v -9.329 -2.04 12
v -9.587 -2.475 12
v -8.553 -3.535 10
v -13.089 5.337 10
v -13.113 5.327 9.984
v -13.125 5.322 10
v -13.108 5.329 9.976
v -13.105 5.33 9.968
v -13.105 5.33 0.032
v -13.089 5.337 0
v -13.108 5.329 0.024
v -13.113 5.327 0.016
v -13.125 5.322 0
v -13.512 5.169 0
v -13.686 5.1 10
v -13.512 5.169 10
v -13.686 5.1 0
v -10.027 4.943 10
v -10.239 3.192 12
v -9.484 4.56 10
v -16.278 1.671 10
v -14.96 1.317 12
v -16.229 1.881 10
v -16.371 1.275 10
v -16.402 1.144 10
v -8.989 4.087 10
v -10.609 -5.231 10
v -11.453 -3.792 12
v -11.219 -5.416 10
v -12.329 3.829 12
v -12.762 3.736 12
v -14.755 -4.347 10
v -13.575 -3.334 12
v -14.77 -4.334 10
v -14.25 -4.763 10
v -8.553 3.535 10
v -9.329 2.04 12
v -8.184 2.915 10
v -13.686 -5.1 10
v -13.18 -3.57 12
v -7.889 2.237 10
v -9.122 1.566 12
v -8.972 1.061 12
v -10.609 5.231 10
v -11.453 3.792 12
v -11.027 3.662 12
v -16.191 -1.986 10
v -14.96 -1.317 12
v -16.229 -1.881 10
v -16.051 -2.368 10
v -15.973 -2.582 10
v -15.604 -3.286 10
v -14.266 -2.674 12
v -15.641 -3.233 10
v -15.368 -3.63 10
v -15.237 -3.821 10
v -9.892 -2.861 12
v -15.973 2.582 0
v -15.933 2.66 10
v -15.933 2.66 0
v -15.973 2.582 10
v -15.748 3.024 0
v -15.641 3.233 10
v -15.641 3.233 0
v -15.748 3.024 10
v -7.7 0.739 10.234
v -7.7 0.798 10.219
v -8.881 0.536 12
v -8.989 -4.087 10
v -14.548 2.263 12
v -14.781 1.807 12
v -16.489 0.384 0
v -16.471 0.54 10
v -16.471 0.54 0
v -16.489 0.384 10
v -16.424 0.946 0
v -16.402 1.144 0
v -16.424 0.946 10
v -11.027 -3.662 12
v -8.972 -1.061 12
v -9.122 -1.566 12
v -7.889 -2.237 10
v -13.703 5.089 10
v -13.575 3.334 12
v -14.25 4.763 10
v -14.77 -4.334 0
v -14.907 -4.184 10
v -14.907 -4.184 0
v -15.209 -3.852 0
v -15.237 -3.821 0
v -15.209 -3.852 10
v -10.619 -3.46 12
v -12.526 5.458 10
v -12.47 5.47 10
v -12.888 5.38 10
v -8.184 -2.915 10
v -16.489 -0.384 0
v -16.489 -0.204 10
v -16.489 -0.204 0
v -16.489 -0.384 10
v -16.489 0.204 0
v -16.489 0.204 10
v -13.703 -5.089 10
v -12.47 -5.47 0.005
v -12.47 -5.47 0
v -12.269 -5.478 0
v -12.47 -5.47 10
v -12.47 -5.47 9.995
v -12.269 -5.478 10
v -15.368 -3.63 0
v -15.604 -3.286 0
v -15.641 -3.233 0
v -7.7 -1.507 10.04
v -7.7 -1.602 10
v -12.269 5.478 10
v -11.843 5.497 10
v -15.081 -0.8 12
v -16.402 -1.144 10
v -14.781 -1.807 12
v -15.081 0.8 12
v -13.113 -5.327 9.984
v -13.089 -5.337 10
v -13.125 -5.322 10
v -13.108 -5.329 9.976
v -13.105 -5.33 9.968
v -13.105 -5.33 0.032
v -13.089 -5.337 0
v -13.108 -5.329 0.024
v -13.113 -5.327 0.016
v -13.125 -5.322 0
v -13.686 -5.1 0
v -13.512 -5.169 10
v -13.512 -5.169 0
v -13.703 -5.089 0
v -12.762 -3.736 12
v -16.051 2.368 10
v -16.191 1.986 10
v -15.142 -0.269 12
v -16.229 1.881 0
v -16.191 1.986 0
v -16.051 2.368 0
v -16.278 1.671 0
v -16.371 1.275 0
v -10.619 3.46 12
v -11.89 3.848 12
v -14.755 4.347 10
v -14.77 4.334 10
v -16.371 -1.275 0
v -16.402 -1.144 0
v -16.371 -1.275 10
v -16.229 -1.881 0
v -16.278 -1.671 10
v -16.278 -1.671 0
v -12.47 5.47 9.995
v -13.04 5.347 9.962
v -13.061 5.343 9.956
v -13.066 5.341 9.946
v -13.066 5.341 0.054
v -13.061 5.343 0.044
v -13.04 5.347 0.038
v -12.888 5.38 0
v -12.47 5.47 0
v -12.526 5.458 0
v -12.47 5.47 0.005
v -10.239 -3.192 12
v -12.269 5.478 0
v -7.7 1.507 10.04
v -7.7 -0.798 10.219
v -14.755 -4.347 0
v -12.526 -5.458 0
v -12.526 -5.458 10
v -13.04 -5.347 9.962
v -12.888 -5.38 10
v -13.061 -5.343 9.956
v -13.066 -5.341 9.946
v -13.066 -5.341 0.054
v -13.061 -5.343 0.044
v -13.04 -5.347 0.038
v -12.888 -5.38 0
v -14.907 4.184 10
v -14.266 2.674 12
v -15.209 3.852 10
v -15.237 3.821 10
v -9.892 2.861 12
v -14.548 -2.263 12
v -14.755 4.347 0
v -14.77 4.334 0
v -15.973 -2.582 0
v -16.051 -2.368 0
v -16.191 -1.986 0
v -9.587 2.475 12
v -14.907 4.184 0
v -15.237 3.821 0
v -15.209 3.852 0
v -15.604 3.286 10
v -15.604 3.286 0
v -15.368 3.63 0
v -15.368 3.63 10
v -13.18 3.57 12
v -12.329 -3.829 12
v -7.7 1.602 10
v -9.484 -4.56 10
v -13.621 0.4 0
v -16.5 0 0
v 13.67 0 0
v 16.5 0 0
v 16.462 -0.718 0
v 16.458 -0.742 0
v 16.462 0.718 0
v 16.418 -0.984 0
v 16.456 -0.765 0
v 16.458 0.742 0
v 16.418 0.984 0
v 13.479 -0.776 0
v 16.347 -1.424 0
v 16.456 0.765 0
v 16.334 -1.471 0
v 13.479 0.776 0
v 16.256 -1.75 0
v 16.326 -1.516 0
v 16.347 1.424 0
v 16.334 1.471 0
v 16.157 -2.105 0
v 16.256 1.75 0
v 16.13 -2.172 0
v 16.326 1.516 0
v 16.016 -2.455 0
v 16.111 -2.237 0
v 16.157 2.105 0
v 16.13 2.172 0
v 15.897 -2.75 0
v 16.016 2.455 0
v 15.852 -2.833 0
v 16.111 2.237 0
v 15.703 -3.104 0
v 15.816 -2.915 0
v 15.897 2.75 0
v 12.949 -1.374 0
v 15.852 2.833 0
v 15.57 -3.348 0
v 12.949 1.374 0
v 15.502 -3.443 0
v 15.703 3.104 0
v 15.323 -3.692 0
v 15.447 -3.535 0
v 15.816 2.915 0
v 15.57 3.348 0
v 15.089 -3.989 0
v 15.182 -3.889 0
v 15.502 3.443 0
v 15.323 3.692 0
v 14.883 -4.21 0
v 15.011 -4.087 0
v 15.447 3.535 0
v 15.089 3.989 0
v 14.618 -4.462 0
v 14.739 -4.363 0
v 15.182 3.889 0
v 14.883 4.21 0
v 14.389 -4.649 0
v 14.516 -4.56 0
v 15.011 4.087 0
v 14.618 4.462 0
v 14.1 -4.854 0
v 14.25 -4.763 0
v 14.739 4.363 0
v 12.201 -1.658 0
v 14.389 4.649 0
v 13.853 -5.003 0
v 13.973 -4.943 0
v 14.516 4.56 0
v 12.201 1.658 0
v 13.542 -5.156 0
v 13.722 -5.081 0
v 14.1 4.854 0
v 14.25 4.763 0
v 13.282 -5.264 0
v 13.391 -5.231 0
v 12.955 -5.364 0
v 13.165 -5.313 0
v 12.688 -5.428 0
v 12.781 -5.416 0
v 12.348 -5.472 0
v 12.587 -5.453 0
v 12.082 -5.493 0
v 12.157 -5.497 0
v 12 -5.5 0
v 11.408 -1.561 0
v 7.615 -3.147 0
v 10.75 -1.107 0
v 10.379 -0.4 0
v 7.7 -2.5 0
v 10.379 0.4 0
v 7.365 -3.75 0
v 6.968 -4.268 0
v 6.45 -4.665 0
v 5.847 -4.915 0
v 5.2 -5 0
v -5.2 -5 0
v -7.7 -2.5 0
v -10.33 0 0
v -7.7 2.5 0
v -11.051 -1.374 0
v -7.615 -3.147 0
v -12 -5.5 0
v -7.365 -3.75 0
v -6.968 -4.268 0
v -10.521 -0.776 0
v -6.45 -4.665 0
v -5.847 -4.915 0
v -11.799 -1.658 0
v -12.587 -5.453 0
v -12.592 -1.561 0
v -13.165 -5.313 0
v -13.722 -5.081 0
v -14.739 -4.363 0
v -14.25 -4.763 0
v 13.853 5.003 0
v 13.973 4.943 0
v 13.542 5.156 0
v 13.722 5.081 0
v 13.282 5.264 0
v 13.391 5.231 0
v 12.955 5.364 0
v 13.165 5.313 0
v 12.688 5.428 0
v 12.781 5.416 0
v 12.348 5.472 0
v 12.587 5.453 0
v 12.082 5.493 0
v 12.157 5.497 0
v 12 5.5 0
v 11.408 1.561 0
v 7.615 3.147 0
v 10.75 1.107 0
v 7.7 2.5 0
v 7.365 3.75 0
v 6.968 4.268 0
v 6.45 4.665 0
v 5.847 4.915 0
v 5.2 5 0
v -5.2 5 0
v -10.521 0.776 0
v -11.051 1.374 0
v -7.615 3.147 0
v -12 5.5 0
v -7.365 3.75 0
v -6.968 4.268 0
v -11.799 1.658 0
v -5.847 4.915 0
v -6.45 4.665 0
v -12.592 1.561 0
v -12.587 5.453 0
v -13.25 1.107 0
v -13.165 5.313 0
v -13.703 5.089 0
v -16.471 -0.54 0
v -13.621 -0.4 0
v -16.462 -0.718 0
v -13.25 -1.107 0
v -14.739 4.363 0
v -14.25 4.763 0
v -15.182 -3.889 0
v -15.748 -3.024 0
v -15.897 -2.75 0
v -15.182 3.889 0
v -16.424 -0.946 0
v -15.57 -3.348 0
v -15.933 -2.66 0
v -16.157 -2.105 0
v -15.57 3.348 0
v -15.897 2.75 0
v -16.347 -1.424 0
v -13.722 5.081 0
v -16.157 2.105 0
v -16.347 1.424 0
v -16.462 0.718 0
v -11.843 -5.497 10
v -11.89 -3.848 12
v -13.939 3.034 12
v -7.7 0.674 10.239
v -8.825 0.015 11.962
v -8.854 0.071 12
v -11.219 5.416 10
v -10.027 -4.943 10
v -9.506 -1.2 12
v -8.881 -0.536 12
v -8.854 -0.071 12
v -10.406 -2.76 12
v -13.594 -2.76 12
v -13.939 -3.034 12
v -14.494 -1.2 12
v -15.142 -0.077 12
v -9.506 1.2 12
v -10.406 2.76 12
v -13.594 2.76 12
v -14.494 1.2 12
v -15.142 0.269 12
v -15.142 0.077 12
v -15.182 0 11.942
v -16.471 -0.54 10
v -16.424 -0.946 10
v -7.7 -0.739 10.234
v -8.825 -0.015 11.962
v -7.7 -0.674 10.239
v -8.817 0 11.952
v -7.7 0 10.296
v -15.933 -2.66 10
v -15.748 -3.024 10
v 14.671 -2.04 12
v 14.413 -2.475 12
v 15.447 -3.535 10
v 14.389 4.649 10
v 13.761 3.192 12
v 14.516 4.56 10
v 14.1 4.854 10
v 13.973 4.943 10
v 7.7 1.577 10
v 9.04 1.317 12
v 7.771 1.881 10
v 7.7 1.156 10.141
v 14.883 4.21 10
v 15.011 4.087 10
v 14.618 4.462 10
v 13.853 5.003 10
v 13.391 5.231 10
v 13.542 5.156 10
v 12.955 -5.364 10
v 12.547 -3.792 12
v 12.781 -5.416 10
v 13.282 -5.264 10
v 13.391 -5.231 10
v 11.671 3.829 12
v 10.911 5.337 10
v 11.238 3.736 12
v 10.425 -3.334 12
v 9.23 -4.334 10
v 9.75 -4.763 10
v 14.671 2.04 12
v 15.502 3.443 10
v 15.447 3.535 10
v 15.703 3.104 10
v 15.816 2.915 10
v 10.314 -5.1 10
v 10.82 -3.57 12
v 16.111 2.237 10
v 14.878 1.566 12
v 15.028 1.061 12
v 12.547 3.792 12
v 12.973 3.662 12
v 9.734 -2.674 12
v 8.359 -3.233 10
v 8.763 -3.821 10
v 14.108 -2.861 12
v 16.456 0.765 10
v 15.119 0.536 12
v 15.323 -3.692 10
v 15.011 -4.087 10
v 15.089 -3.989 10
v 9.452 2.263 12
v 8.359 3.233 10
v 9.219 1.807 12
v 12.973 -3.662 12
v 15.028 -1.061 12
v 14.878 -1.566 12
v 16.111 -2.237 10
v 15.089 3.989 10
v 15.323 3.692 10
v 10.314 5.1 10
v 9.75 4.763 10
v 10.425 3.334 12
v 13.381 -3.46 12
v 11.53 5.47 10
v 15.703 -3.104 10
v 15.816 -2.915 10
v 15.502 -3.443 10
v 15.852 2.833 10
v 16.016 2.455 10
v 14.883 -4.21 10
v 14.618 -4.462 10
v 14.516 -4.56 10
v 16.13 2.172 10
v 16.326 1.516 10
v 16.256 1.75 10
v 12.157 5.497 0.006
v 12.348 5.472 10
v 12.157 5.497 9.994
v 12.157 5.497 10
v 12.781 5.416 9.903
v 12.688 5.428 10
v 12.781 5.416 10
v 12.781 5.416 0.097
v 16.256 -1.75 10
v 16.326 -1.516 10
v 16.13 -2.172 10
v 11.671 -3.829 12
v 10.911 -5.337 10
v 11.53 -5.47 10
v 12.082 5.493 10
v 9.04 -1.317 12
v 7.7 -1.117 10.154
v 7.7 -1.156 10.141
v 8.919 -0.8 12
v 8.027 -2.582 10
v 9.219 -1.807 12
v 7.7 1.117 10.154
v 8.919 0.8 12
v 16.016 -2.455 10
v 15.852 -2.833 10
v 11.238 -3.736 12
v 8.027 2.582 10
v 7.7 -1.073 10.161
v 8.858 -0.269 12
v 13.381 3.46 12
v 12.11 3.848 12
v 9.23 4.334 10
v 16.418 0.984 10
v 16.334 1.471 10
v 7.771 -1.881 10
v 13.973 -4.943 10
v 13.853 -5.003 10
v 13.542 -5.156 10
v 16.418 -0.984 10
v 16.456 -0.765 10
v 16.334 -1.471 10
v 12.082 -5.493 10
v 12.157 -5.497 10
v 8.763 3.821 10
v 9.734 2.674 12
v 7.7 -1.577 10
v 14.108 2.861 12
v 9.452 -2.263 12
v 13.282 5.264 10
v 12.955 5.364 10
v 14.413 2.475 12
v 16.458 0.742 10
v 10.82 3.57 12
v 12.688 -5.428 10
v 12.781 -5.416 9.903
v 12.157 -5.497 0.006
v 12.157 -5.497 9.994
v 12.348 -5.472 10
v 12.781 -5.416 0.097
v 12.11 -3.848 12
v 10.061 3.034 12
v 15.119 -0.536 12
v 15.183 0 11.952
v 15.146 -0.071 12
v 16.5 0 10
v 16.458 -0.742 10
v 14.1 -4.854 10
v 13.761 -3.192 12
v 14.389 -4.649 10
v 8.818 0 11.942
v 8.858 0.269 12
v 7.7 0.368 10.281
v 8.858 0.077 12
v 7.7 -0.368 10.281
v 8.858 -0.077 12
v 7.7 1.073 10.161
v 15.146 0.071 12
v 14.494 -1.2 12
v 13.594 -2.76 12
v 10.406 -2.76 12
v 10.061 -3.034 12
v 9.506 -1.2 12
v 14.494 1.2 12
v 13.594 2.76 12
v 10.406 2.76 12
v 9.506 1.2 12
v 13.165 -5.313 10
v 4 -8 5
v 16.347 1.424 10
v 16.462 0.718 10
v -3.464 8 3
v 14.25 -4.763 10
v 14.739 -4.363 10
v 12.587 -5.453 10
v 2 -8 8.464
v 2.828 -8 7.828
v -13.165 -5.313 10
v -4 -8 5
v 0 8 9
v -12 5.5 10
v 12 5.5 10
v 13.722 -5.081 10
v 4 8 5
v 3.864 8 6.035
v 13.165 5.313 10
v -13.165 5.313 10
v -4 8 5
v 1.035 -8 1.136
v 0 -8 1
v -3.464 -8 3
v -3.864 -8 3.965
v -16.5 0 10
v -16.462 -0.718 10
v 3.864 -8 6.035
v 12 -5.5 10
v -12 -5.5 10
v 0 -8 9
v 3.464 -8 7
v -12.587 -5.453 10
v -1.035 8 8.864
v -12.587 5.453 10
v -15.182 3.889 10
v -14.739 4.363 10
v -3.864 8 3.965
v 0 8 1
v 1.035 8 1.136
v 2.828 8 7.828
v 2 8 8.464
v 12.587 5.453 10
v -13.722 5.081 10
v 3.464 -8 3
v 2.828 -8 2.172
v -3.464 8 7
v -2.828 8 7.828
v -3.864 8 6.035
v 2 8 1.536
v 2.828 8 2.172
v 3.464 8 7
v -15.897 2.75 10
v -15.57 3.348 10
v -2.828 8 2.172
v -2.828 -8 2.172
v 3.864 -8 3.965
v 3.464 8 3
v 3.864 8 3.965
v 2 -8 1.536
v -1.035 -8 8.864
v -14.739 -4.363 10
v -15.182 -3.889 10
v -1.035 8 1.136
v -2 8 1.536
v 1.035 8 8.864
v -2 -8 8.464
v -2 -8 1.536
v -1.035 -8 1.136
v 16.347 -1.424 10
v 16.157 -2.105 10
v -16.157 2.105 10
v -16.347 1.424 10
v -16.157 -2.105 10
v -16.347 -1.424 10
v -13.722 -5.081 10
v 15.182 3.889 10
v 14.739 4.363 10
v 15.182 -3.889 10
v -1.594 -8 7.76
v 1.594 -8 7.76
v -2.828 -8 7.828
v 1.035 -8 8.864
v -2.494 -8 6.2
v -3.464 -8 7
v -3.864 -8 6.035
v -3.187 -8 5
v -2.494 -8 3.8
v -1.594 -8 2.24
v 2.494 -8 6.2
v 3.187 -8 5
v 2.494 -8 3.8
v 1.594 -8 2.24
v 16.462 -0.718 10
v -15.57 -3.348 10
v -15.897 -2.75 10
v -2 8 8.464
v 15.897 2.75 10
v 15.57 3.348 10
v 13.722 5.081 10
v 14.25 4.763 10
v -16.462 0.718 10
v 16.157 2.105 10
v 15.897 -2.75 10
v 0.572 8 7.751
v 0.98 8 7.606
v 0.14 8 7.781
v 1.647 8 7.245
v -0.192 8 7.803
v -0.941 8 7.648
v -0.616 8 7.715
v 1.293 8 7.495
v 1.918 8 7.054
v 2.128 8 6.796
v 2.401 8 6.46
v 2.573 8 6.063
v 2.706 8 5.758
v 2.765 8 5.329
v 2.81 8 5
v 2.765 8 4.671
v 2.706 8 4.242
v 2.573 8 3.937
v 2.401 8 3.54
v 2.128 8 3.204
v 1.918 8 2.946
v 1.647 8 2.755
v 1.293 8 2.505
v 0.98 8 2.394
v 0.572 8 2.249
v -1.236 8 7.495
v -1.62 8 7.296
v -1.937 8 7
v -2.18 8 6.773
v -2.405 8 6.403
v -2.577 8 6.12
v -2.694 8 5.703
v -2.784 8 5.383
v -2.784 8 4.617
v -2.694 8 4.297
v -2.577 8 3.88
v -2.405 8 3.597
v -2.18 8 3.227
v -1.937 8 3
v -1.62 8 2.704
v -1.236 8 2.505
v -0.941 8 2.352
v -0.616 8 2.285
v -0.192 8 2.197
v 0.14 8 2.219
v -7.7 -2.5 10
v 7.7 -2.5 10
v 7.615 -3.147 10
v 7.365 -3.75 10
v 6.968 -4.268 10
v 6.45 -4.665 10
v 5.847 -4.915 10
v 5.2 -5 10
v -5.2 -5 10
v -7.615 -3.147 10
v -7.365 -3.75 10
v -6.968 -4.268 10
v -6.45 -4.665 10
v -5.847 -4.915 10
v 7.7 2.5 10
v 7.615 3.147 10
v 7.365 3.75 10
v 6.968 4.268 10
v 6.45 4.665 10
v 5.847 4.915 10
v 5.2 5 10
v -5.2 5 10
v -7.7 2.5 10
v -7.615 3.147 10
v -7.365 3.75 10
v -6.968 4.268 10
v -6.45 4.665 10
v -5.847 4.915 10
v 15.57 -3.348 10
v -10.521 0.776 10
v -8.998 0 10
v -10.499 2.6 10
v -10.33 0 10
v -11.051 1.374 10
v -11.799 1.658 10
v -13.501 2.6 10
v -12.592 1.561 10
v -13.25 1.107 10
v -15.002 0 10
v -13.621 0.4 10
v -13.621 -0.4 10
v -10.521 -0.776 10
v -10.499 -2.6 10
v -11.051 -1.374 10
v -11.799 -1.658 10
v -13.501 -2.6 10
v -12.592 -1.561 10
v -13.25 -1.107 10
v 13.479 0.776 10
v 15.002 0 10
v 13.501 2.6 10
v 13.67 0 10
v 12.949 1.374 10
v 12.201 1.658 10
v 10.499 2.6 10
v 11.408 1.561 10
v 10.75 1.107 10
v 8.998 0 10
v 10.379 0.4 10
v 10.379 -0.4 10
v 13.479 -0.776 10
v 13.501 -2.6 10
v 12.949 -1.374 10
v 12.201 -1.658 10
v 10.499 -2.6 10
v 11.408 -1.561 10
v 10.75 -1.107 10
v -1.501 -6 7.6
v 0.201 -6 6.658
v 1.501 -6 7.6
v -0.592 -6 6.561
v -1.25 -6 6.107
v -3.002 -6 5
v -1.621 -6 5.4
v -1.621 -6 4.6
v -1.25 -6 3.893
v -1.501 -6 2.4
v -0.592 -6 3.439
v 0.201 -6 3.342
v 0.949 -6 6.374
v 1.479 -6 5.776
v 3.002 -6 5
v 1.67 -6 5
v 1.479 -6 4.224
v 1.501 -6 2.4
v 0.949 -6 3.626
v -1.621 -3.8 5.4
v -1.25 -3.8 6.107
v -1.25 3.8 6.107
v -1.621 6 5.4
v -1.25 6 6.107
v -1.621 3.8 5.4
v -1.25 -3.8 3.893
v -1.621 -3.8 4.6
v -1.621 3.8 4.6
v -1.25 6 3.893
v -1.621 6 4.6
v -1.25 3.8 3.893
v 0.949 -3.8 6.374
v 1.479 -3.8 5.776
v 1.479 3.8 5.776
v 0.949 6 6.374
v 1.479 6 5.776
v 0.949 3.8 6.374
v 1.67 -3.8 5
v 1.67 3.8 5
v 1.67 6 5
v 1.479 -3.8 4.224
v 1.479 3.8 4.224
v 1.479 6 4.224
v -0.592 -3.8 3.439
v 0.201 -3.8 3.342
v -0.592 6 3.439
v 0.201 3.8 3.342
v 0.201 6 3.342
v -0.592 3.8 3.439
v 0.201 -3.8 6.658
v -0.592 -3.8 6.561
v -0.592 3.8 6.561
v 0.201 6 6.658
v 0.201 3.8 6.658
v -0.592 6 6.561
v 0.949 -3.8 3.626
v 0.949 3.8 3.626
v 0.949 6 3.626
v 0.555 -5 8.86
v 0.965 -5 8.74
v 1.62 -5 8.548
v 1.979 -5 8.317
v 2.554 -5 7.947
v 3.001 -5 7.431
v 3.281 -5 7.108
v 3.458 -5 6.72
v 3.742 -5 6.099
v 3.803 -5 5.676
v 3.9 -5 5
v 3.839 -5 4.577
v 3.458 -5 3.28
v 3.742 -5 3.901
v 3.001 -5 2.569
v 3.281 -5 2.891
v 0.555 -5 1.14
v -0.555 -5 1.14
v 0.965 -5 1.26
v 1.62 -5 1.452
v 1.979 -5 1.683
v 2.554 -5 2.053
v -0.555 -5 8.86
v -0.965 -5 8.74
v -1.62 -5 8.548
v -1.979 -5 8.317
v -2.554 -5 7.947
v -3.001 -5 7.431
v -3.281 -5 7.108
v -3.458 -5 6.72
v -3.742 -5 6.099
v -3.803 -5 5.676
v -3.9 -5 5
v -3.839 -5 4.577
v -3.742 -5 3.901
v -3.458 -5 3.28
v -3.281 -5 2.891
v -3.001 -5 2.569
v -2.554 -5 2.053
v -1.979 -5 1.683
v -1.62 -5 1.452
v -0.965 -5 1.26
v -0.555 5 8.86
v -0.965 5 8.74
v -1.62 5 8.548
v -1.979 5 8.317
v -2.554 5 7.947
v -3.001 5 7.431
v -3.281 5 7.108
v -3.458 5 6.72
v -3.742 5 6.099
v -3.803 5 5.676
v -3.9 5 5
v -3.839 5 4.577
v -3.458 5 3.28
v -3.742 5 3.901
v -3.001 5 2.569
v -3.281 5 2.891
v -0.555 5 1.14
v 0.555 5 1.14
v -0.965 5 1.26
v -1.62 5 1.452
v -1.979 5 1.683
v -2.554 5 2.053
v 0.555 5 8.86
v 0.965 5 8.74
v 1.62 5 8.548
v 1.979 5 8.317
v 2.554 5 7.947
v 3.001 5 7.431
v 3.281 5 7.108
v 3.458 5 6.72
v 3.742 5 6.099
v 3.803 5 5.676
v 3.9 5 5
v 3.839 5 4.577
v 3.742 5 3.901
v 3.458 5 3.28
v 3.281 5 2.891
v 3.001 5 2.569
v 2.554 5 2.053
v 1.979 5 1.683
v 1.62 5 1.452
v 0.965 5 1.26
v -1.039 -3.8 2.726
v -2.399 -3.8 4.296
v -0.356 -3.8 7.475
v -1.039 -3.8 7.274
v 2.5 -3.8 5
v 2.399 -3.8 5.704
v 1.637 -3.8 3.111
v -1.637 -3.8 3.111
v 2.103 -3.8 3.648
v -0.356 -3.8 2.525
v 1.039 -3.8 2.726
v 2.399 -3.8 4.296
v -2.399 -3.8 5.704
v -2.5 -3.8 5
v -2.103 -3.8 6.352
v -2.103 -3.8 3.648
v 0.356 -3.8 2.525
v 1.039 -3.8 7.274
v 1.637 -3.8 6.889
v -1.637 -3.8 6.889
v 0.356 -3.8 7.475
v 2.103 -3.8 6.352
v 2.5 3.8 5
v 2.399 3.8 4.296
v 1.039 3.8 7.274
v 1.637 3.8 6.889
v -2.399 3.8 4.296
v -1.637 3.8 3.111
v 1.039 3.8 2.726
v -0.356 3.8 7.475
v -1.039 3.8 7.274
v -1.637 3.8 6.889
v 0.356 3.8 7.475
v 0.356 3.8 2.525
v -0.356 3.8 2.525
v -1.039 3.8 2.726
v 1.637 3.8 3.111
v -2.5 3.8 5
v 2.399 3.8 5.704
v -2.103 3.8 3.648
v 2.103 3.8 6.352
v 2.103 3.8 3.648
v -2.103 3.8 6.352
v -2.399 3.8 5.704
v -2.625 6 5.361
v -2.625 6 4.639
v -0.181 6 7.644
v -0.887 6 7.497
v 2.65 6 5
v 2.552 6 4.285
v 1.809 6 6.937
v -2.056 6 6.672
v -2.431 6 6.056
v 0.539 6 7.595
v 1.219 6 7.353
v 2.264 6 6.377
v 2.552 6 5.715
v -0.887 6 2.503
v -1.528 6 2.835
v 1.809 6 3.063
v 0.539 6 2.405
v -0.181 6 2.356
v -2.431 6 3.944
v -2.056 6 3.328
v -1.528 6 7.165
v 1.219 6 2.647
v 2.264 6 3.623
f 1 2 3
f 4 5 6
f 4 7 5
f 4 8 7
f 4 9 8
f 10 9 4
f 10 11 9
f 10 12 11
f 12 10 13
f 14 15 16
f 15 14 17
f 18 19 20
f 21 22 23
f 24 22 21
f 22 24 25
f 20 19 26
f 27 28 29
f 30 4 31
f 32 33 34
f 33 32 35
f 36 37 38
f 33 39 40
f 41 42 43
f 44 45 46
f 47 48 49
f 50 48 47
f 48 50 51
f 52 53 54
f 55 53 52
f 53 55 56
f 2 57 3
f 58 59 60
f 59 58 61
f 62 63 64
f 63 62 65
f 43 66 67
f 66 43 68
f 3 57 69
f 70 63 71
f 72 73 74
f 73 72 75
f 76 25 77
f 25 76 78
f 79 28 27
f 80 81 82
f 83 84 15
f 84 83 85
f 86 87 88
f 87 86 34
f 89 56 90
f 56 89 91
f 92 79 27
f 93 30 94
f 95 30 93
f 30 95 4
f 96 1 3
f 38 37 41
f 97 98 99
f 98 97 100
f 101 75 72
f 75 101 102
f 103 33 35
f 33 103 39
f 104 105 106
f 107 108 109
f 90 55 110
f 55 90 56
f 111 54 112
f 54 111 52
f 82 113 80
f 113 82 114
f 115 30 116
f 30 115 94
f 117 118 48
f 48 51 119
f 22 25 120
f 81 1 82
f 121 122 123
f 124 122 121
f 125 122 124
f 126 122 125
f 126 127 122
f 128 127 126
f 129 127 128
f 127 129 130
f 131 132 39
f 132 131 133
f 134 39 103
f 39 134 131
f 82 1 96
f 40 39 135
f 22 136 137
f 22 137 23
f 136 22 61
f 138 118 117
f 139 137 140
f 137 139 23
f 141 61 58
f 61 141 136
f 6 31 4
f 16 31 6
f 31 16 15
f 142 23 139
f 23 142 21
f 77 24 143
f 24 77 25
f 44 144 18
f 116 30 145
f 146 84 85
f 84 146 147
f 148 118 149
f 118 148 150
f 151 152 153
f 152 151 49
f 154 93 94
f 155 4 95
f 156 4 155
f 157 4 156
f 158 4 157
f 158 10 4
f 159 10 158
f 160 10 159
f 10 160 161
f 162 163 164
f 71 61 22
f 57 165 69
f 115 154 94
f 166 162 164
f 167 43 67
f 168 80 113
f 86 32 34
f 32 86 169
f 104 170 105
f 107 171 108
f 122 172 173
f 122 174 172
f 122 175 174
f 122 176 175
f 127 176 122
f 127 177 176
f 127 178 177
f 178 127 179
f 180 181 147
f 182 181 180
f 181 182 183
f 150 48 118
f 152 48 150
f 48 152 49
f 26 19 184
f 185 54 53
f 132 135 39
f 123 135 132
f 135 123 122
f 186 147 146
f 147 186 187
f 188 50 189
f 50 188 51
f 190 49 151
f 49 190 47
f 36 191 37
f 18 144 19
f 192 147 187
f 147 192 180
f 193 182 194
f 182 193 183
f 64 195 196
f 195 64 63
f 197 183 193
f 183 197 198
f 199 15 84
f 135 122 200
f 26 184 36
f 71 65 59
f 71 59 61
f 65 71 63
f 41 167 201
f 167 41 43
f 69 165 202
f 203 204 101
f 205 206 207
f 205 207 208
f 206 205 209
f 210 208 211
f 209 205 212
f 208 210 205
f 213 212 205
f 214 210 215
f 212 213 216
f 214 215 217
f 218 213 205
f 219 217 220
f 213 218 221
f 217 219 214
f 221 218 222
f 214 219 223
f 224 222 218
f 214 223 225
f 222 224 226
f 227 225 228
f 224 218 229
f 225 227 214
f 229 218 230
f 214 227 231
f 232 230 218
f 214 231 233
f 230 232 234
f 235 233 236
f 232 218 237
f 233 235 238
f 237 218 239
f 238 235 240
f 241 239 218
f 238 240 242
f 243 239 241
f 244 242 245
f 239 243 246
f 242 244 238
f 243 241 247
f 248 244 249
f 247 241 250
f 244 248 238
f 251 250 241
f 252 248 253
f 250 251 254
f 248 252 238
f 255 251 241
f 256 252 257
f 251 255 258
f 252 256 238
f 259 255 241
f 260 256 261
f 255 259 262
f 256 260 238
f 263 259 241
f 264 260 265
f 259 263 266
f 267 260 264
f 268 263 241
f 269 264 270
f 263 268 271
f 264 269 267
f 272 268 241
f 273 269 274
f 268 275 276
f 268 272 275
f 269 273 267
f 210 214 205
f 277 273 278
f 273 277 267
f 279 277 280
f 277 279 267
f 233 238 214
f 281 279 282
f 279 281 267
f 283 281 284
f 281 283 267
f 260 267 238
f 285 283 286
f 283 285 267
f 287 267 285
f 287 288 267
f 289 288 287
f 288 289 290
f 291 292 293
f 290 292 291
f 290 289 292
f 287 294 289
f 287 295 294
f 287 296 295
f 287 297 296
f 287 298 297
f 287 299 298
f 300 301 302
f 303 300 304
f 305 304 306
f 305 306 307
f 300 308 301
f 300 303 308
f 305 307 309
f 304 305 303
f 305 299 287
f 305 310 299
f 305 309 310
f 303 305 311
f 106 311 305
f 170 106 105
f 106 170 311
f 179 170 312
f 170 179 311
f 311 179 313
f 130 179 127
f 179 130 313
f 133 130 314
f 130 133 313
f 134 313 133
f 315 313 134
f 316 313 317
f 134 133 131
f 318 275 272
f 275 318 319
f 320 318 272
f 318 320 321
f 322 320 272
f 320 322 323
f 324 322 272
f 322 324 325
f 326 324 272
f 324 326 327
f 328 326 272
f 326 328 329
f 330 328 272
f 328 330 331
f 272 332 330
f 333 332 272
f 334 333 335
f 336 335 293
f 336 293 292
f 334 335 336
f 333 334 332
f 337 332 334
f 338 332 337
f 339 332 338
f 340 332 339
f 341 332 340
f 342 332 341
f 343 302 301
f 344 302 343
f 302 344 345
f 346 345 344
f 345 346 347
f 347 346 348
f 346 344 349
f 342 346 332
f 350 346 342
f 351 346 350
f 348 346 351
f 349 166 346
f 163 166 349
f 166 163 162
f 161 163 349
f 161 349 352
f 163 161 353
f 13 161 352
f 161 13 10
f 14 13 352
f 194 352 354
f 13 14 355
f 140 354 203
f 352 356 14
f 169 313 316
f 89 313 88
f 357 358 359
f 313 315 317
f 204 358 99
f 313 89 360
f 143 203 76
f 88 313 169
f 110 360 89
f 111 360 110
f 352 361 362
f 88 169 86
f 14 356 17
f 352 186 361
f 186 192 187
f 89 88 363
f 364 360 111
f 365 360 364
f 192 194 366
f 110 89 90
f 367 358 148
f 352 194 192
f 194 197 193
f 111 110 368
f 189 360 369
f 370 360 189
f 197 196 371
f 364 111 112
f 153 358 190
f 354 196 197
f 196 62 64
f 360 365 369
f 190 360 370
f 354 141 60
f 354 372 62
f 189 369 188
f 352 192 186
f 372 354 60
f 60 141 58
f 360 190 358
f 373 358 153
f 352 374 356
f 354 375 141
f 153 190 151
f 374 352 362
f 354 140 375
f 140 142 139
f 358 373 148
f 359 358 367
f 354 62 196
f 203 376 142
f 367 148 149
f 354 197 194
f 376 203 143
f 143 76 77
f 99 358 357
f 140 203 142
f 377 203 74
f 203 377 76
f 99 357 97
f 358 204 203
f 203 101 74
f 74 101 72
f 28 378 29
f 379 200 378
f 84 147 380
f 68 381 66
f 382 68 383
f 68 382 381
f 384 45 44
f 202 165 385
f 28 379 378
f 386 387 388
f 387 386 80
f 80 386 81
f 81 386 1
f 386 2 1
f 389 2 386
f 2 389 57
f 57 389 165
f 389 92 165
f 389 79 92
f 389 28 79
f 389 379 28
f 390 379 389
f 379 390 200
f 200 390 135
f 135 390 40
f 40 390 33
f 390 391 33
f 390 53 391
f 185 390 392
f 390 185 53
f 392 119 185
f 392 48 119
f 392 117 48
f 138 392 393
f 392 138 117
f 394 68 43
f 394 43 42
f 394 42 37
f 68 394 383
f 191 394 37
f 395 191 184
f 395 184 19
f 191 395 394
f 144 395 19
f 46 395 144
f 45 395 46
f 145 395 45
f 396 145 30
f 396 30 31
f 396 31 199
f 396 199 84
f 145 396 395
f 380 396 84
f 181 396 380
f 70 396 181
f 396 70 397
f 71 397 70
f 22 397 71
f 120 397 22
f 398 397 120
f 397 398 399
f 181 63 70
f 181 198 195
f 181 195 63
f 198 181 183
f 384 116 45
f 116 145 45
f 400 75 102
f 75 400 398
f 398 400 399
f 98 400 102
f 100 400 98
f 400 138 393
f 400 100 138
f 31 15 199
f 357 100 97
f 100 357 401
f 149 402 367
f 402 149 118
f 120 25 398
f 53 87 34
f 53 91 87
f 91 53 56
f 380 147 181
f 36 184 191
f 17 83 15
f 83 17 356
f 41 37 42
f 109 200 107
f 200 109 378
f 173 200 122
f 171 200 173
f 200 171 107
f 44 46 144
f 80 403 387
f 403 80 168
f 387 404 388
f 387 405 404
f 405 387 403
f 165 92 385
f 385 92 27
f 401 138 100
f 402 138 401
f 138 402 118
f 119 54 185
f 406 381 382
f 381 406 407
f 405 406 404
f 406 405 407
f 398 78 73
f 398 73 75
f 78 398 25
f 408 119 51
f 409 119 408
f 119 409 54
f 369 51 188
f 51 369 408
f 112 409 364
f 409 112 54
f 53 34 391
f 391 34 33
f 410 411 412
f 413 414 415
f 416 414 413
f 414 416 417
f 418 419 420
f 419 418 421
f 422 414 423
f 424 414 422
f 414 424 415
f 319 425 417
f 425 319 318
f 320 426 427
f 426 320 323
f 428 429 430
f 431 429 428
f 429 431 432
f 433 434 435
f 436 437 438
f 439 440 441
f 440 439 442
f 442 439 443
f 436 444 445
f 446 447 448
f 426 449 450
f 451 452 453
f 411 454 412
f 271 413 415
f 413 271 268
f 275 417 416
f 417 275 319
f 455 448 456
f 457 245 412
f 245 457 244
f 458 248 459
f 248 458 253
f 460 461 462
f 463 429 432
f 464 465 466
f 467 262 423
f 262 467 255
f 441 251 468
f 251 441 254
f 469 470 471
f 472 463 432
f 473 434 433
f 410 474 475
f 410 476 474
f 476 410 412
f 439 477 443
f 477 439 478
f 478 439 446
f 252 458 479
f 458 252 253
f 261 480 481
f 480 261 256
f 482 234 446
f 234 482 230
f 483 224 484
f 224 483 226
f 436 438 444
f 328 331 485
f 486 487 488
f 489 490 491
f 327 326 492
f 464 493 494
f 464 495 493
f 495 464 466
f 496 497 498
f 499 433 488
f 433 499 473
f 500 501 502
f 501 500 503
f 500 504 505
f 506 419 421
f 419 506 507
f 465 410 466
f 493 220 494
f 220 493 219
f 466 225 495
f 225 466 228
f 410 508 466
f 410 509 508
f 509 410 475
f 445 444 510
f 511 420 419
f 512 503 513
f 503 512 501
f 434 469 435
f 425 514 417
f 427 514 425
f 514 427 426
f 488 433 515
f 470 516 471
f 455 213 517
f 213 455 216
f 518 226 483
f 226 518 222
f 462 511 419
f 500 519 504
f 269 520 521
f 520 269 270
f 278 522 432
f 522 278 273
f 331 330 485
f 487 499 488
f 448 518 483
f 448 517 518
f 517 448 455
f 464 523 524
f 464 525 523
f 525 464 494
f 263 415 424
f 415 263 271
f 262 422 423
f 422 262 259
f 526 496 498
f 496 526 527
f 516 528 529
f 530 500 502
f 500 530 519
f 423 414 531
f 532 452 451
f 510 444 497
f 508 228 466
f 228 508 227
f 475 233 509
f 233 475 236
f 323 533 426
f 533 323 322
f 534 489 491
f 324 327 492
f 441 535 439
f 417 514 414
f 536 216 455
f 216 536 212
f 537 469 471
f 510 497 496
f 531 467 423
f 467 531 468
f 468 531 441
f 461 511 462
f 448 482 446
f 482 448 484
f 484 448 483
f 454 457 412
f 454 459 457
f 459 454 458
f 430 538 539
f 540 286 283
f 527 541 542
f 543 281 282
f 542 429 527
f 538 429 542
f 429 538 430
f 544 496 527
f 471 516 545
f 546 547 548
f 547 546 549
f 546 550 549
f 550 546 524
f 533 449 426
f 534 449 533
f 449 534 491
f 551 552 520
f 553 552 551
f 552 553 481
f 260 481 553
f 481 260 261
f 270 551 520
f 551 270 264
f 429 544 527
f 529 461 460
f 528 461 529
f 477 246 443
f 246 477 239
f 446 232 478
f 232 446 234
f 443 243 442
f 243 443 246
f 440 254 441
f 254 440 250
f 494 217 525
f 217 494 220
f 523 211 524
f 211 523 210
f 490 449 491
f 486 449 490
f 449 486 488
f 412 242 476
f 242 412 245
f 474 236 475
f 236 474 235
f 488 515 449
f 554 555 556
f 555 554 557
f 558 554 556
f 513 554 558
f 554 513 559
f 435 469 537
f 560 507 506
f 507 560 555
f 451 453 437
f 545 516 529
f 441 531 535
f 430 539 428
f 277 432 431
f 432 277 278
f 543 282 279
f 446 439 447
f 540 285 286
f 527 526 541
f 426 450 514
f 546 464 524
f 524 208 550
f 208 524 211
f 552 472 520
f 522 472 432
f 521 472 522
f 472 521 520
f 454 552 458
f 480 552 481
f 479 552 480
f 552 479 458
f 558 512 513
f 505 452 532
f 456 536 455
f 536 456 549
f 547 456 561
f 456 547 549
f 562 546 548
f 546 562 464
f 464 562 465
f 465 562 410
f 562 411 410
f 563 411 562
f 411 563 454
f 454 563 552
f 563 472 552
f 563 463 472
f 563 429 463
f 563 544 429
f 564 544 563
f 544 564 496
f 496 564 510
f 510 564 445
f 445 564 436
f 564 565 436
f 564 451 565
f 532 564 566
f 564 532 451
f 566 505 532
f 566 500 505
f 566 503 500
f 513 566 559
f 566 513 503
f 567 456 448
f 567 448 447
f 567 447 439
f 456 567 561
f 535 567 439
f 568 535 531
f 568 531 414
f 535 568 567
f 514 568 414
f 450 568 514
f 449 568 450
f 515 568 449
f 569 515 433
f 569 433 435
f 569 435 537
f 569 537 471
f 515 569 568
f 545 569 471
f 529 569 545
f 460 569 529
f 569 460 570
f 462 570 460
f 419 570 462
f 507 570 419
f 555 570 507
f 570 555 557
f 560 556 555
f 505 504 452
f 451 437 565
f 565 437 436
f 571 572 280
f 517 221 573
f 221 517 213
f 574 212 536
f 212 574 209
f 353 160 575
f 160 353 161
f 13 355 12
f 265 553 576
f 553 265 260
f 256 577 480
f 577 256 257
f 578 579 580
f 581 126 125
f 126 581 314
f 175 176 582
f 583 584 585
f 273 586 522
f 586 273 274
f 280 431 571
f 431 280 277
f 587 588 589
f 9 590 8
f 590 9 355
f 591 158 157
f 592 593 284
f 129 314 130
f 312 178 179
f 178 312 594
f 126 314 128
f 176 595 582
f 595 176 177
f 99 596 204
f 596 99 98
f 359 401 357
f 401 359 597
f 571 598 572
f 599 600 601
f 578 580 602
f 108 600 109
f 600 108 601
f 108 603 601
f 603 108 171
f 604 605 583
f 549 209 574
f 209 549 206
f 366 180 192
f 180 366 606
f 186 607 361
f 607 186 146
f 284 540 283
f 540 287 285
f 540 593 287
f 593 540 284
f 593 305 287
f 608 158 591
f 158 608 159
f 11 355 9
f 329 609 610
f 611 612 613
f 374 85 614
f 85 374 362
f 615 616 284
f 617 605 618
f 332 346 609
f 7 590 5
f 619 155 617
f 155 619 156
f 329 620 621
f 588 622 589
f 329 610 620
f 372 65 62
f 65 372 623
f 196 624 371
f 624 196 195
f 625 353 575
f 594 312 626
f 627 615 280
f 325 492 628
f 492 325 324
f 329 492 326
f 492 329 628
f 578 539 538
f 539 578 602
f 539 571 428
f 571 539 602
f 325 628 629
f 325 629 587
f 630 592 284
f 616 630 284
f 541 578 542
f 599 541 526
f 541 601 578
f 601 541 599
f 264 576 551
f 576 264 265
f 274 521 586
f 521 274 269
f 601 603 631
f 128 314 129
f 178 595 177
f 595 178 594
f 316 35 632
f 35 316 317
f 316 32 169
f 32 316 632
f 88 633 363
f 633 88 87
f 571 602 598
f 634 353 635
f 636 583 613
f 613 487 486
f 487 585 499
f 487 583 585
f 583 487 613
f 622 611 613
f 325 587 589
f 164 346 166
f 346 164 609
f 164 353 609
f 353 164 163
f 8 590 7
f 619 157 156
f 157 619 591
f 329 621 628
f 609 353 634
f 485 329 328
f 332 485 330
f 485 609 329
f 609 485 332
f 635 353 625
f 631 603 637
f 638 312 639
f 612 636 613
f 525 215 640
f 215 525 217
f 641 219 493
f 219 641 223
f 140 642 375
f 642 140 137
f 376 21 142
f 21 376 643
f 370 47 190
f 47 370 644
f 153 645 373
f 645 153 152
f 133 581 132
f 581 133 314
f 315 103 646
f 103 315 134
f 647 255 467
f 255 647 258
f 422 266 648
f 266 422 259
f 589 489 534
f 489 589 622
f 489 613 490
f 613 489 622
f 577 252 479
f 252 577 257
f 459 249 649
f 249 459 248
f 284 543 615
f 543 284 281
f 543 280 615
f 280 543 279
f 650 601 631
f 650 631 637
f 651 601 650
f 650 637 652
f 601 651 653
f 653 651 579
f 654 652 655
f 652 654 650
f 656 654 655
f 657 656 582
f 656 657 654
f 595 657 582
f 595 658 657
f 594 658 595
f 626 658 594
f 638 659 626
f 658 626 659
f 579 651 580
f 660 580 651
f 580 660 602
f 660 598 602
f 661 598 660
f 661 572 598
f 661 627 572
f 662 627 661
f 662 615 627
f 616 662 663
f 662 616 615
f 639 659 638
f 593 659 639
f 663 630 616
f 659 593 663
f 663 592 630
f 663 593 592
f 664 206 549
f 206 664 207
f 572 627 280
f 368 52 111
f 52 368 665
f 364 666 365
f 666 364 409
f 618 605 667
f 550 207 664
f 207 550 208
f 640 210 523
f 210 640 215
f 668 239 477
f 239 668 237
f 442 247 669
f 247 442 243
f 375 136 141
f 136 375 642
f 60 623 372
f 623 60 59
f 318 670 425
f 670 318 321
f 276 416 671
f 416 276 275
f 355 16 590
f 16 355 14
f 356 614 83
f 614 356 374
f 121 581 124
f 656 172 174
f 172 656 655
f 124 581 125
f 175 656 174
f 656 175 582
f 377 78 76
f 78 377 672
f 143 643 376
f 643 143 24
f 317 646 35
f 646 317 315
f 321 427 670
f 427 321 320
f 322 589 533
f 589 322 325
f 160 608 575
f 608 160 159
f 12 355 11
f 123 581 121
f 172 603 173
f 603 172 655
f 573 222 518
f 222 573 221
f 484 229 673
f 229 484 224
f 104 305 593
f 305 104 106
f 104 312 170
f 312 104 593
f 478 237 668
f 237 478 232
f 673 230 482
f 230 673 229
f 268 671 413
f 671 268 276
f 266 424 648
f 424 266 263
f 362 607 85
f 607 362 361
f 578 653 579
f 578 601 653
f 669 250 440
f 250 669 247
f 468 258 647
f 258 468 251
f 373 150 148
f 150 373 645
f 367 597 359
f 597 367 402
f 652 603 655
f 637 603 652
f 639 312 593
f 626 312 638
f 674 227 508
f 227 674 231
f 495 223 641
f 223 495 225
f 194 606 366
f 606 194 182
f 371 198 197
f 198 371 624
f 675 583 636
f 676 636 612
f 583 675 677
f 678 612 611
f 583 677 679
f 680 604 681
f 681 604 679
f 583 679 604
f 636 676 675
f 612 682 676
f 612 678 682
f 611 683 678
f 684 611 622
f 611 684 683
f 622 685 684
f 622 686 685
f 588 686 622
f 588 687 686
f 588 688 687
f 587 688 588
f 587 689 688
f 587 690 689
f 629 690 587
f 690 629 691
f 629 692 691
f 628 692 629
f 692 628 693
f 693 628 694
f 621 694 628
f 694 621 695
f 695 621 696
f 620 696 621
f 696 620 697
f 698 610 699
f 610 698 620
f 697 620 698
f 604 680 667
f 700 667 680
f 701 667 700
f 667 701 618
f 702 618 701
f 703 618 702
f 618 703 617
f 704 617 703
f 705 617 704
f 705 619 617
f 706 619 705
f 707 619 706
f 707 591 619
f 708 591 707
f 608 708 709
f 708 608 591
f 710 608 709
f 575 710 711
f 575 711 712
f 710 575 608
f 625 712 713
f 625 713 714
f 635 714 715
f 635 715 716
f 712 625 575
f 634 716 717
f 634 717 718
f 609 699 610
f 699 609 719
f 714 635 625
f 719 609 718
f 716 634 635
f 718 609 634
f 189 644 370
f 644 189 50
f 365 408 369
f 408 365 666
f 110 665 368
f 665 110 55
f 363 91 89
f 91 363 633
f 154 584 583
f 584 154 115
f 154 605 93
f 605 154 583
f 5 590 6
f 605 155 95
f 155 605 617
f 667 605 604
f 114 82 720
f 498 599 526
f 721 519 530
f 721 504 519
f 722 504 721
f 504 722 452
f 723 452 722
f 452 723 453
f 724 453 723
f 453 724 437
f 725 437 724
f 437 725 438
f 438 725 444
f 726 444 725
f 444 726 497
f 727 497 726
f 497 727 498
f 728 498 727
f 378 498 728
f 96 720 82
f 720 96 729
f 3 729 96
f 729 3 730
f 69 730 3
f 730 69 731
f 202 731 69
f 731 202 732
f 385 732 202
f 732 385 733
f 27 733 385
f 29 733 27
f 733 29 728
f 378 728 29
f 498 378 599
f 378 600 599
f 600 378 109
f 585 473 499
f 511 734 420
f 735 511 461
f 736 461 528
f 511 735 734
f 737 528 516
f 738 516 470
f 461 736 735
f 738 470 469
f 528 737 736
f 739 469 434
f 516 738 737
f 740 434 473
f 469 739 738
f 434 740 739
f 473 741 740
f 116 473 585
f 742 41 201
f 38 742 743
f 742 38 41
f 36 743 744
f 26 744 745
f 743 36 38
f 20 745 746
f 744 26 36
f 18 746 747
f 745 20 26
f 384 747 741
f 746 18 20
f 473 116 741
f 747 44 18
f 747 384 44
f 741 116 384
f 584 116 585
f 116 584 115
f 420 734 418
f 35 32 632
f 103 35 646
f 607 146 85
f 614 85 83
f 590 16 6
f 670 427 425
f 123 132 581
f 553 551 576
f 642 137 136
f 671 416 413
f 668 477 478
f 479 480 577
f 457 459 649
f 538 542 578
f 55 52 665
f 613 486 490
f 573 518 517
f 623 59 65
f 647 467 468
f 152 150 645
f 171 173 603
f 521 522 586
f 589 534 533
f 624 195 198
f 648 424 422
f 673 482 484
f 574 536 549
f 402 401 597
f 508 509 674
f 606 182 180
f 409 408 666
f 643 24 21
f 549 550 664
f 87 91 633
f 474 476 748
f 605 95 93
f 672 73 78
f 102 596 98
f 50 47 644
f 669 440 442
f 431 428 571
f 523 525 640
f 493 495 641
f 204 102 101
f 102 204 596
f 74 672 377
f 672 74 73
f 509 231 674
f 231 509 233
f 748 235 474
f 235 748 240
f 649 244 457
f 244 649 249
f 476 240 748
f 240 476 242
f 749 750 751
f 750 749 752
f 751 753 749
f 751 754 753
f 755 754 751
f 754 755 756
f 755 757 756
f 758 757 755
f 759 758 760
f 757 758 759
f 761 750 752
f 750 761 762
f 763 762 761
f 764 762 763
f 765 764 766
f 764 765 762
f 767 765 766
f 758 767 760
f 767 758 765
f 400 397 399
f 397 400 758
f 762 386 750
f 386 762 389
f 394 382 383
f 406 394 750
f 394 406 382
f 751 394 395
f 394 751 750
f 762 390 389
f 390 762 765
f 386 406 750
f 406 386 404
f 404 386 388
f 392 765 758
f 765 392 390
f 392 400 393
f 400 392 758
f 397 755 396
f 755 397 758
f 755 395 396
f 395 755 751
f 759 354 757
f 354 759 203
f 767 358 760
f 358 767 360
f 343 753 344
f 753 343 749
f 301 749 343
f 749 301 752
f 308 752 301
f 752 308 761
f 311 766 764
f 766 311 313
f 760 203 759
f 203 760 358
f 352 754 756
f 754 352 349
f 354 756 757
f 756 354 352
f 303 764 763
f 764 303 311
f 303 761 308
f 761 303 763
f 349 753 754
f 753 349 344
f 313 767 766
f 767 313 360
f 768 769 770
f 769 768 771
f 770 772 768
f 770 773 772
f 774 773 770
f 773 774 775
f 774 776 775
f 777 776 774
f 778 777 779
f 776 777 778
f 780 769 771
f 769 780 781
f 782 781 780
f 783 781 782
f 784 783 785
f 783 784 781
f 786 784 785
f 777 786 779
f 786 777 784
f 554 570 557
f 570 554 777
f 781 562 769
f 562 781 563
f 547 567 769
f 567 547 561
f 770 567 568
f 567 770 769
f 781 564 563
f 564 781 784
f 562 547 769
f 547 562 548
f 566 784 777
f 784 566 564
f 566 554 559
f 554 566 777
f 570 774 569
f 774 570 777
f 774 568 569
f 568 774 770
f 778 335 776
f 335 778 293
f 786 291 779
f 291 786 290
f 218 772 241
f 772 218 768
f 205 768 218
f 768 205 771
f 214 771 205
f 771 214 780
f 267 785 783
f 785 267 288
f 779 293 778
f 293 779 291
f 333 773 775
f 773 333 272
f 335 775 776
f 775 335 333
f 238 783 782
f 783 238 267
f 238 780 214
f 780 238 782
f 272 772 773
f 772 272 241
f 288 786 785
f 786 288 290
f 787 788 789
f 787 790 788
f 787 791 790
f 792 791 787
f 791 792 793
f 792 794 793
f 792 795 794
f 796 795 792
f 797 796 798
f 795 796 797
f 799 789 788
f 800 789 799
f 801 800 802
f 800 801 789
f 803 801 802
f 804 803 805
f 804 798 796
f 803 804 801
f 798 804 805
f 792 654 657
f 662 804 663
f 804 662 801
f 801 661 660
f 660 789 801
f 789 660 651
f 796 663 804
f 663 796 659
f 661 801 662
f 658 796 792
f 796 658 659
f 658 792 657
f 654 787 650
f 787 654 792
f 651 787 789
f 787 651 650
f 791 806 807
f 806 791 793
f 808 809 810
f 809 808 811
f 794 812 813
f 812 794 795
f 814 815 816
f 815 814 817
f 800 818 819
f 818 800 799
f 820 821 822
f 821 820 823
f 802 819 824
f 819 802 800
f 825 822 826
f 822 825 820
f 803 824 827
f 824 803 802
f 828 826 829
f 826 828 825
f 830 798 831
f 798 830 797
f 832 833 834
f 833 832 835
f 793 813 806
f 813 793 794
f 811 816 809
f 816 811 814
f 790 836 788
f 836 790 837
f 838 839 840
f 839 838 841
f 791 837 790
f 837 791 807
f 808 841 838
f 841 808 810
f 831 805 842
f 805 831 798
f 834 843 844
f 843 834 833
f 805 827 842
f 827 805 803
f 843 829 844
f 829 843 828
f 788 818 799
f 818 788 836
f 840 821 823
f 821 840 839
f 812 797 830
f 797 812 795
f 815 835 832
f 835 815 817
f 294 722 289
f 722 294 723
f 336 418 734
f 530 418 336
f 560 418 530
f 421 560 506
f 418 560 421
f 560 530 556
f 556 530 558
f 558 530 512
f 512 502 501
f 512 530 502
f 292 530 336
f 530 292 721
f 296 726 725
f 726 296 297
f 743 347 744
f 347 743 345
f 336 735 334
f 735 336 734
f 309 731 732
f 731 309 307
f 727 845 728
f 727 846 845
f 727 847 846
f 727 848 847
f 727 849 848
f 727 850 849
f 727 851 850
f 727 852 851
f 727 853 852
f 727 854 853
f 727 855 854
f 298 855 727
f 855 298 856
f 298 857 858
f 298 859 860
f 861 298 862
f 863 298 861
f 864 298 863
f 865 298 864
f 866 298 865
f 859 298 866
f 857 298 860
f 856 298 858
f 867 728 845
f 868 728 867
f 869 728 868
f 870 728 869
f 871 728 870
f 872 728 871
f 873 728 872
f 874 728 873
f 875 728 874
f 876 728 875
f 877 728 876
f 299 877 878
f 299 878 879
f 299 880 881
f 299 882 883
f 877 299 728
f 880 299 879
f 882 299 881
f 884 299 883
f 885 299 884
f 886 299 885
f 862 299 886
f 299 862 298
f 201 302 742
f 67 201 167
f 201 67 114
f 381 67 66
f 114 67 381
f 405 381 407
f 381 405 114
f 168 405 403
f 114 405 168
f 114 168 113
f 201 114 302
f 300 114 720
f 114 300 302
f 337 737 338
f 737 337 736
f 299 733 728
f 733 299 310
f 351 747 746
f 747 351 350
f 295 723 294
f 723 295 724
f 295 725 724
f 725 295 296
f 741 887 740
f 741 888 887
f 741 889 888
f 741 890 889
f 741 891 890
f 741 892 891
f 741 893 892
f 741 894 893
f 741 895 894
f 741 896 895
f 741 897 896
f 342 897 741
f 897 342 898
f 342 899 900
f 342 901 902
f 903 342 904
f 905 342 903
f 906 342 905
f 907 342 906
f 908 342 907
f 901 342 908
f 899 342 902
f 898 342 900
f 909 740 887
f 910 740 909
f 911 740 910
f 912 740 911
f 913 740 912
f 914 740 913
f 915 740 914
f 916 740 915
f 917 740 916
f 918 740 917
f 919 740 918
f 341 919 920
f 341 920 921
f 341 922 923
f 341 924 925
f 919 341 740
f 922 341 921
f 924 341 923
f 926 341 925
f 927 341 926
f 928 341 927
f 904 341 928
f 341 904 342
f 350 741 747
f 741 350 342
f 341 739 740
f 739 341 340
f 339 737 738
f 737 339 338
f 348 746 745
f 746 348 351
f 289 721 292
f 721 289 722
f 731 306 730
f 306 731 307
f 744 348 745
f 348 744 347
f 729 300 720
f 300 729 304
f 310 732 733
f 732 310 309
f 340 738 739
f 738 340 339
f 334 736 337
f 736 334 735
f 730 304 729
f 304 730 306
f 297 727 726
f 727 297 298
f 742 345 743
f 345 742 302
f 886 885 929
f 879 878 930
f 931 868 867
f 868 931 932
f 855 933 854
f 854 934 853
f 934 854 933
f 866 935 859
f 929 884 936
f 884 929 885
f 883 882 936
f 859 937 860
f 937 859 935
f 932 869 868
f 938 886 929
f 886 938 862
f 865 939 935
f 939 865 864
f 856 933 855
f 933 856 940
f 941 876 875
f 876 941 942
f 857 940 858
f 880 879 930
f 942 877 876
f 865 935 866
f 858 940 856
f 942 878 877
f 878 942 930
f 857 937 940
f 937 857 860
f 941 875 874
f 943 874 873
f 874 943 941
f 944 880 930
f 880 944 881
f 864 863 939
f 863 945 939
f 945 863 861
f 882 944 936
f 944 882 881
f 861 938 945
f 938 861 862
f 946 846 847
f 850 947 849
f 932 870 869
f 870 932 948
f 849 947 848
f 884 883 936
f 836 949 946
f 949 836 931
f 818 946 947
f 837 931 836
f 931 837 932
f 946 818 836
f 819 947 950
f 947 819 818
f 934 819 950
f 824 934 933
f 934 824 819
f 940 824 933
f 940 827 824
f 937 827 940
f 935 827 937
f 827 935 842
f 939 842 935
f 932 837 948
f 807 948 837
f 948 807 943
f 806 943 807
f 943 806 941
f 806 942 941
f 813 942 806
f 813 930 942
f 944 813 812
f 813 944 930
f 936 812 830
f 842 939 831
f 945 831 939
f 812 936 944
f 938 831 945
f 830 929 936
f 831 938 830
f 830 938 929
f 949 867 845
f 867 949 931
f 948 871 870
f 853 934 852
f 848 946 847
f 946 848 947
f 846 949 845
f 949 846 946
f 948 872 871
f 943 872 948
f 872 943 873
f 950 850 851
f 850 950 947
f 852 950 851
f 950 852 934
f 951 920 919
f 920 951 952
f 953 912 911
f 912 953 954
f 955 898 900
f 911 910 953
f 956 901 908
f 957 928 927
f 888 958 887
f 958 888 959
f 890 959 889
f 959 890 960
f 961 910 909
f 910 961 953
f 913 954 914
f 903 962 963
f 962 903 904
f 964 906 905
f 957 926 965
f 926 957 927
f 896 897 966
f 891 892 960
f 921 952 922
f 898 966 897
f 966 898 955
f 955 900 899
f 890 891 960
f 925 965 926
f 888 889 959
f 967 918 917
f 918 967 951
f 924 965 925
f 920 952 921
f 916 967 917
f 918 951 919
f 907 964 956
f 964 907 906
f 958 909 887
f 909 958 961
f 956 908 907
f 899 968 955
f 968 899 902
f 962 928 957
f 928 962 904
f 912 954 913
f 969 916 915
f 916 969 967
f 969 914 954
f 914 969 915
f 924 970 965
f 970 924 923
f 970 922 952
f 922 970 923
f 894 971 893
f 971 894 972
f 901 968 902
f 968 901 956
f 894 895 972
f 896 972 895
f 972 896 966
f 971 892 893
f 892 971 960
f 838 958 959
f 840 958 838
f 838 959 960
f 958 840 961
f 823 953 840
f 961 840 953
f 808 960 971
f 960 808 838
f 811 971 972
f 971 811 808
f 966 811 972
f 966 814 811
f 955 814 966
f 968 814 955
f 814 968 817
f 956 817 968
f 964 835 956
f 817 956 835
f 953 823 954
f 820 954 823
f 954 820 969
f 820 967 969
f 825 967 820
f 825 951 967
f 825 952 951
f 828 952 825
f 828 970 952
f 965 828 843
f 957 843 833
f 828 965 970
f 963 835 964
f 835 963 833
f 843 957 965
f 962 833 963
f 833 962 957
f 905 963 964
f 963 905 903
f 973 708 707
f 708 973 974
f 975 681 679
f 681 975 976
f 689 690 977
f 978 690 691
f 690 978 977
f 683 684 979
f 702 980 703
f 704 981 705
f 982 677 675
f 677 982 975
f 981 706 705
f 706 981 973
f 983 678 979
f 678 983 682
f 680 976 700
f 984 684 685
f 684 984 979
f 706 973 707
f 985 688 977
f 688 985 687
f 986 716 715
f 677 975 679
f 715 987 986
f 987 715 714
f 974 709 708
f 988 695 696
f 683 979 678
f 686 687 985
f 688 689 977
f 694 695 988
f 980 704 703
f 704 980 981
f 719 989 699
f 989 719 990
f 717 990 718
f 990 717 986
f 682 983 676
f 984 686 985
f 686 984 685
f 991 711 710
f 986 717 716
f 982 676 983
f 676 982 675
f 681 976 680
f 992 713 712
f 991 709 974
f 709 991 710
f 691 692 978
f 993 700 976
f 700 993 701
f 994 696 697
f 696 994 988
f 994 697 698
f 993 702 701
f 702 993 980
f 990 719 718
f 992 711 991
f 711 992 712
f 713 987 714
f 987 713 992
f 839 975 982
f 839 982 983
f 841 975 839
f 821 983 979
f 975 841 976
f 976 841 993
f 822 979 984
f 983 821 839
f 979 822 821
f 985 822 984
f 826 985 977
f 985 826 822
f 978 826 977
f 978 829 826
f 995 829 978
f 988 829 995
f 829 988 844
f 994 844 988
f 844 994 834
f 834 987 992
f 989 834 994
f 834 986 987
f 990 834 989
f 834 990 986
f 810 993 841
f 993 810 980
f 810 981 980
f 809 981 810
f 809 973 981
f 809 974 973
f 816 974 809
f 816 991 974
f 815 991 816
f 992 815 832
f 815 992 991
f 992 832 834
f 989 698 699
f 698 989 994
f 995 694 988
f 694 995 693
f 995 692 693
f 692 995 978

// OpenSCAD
boltSep = 12;
baseRad = 5;
m3rad = 2.94/2 + .1;
baseHeight = 10;

module boltHolder() {
  scale([.9,1.1,1]) hull() {
    cylinder(r=baseRad,h=baseHeight,$fn=45);
    translate([0,0,baseHeight+1]) cylinder(r=3.5,h=1,$fn=45);
  }
}

module nutHole() {
  union() {
    cylinder(r1=5.2/2/.866,r2=3/.866,h=5,$fn=6);
    translate([0,0,-30]) cylinder(r=m3rad+.1,h=31,$fn=13);
  }
}

module pulleyProxy() {
  rotate([90,0,0]) difference() {
    cylinder(r=11.5/2,h=8,center=true,$fn=48);
    cylinder(r=1.5,h=9,center=true,$fn=16);
  } 
}

module pulleyArea() {
w2=5.2;
h2=2.5;
cr=2.5;
bh=baseHeight+5;
ef=24;
  difference() {
    hull() {
      translate([-w2, h2,-1]) cylinder(r=cr,h=bh,$fn=ef);
      translate([-w2,-h2,-1]) cylinder(r=cr,h=bh,$fn=ef);
      translate([ w2, h2,-1]) cylinder(r=cr,h=bh,$fn=ef);
      translate([ w2,-h2,-1]) cylinder(r=cr,h=bh,$fn=ef);
    }

    translate([0,-3.8,baseHeight/2]) rotate([ 90,0,0]) cylinder(r1=2.5,r2=6,h=3,$fn=22);
    translate([0, 3.8,baseHeight/2]) rotate([-90,0,0]) cylinder(r1=2.5,r2=6,h=3,$fn=22);
  }
}

module pulleyHolder() {
  difference() {
    union() {
      translate([-boltSep,0,0]) boltHolder();
      translate([ boltSep,0,0]) boltHolder();
      hull() {
        translate([-boltSep,0,0]) scale([.9,1.1,1]) cylinder(r=baseRad,h=baseHeight,$fn=48);
        translate([ boltSep,0,0]) scale([.9,1.1,1]) cylinder(r=baseRad,h=baseHeight,$fn=48);
        translate([0,0,baseHeight/2]) rotate([90,0,0]) cylinder(r=4,h=16,center=true,$fn=24);
      }
    }

    translate([-boltSep,0,baseHeight]) nutHole();
    translate([ boltSep,0,baseHeight]) nutHole();
    translate([0,-baseRad-1,baseHeight/2]) rotate([ 90,0,0]) nutHole();
    translate([0, baseRad+1,baseHeight/2]) rotate([-90,0,0])
      cylinder(r1=5.5/2-.1,r2=5.5/2+.3,h=5,$fn=23);
    pulleyArea();
  }
}


pulleyHolder();

%translate([0,0,baseHeight/2]) pulleyProxy();
